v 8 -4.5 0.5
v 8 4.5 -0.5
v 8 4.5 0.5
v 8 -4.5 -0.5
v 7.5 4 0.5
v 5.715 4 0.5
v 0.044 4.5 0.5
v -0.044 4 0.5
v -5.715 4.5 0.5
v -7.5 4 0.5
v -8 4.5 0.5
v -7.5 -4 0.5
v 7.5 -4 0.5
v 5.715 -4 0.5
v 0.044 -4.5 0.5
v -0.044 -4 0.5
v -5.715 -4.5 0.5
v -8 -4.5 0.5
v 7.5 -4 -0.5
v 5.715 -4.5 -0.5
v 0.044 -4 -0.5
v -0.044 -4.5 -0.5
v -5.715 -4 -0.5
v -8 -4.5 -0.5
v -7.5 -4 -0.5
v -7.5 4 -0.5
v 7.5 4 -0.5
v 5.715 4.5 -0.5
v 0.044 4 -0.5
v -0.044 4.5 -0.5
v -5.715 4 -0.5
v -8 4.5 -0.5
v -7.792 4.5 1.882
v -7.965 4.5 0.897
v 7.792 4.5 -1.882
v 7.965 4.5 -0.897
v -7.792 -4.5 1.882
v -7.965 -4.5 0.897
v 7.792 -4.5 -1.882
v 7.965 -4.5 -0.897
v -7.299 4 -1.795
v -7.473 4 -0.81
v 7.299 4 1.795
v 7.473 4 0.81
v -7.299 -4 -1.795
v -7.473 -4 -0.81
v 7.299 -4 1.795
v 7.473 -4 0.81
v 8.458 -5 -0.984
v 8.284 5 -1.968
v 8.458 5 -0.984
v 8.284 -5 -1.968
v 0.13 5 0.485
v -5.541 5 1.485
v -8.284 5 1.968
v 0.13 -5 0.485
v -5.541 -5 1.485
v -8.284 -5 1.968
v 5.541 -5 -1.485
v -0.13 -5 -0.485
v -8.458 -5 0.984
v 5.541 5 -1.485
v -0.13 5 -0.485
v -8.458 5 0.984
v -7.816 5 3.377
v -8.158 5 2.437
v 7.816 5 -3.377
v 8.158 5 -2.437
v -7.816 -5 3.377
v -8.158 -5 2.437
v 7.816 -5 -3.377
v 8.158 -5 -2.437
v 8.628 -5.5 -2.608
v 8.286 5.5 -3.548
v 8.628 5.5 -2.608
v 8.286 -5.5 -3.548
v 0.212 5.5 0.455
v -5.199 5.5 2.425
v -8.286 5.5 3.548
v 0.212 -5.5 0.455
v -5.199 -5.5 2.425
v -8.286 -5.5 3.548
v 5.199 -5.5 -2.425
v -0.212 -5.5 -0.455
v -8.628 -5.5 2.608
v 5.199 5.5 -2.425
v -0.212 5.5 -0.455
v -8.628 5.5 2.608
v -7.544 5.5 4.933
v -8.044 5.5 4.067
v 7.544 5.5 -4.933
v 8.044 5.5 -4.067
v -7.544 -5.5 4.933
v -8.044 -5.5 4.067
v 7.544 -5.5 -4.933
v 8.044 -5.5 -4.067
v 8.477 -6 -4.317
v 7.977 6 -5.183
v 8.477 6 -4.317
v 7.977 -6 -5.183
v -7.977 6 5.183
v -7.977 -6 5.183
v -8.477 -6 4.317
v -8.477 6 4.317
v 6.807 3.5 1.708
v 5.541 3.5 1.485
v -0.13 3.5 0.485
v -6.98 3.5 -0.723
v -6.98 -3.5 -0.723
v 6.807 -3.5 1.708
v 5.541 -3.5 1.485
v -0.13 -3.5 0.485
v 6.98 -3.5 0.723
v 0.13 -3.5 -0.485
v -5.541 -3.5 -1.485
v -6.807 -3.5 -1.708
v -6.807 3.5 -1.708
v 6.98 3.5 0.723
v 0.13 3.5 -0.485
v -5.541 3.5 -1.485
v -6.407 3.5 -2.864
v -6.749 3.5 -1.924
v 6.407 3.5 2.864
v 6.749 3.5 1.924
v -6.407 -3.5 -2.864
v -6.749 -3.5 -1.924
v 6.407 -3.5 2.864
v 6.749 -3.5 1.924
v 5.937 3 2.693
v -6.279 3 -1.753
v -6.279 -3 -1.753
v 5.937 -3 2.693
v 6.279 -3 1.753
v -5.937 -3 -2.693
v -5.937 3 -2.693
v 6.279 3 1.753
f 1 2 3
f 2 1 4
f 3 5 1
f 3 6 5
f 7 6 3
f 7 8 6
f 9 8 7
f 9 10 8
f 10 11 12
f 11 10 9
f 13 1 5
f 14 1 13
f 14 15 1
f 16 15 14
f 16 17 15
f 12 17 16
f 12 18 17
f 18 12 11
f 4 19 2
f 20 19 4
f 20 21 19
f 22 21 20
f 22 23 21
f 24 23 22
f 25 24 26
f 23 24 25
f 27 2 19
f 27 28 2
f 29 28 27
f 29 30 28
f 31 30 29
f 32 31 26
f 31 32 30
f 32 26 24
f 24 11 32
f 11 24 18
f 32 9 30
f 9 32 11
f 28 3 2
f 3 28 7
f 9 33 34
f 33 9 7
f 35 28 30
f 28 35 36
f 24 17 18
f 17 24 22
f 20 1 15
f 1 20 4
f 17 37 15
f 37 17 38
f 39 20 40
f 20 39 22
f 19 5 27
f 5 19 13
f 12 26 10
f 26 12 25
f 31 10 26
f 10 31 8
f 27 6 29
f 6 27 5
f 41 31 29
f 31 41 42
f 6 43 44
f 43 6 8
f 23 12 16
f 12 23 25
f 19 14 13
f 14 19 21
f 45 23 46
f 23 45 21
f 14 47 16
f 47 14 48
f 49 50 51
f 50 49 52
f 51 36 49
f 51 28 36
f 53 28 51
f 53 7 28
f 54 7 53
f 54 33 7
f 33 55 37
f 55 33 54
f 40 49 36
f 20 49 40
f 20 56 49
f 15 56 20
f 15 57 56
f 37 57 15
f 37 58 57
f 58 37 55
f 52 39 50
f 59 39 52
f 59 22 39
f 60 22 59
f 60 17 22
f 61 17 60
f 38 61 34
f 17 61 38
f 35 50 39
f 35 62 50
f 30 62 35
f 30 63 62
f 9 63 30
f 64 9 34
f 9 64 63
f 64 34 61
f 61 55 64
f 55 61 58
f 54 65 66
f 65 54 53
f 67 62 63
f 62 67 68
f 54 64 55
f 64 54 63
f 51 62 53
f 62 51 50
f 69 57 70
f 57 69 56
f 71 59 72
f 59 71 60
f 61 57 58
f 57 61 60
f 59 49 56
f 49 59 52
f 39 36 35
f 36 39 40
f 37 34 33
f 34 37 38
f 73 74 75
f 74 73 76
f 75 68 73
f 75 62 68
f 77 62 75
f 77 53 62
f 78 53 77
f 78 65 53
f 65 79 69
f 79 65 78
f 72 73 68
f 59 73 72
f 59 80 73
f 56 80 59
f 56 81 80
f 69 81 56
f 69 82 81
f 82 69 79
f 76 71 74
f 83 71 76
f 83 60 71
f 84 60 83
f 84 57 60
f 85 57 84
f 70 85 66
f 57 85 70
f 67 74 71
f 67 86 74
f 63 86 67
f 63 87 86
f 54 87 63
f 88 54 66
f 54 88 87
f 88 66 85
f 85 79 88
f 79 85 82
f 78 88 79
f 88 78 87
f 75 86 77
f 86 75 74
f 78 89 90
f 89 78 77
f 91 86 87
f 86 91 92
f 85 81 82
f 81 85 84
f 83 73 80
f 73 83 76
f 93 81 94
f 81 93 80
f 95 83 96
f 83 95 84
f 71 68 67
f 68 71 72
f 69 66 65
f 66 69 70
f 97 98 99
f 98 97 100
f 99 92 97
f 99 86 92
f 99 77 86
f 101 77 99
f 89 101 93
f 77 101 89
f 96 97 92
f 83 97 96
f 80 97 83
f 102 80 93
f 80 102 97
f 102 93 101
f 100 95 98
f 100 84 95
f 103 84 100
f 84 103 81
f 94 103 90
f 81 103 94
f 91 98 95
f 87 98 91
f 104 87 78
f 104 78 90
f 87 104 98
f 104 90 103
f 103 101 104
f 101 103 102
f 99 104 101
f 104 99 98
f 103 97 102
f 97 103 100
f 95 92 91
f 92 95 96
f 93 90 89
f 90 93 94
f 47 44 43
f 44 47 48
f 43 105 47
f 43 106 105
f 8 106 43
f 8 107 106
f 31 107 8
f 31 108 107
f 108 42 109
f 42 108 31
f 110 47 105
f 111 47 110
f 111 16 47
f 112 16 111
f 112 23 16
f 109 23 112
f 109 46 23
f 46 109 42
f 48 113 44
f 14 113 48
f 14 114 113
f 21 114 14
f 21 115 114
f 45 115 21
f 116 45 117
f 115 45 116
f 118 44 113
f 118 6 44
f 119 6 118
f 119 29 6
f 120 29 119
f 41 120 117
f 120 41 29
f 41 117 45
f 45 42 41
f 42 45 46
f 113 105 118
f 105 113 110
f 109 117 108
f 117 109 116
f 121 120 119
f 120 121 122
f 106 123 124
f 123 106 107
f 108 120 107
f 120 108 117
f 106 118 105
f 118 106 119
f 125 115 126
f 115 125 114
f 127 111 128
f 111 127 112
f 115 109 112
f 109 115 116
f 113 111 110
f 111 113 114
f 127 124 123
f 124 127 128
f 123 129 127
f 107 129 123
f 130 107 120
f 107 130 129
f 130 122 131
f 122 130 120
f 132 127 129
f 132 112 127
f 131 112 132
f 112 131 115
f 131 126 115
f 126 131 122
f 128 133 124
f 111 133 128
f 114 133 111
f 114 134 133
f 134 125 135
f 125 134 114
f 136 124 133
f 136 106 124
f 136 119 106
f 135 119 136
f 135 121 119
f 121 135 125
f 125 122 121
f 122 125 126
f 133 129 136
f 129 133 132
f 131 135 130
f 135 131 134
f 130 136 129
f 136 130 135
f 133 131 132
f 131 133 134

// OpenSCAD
x = 16;
y = 9;
h = 1;
thickness = 1;
angle = 10;

shape(x, y, h);
for (i=[0:3]) {
    rotate([0, angle*i, 0])
    shape(x + thickness*i, y + thickness*i, h);
}
for (i=[0:2]) {
    rotate([0, angle*i*(-1), 0])
    shape(x - thickness*i, y - thickness*i, h);
}

module shape(x, y, h) {
    difference() {
        cube([x,y,h],center=true);
        translate([0,0,0])
        cube([x - thickness,y - thickness,h],center=true);
    }
}
    
